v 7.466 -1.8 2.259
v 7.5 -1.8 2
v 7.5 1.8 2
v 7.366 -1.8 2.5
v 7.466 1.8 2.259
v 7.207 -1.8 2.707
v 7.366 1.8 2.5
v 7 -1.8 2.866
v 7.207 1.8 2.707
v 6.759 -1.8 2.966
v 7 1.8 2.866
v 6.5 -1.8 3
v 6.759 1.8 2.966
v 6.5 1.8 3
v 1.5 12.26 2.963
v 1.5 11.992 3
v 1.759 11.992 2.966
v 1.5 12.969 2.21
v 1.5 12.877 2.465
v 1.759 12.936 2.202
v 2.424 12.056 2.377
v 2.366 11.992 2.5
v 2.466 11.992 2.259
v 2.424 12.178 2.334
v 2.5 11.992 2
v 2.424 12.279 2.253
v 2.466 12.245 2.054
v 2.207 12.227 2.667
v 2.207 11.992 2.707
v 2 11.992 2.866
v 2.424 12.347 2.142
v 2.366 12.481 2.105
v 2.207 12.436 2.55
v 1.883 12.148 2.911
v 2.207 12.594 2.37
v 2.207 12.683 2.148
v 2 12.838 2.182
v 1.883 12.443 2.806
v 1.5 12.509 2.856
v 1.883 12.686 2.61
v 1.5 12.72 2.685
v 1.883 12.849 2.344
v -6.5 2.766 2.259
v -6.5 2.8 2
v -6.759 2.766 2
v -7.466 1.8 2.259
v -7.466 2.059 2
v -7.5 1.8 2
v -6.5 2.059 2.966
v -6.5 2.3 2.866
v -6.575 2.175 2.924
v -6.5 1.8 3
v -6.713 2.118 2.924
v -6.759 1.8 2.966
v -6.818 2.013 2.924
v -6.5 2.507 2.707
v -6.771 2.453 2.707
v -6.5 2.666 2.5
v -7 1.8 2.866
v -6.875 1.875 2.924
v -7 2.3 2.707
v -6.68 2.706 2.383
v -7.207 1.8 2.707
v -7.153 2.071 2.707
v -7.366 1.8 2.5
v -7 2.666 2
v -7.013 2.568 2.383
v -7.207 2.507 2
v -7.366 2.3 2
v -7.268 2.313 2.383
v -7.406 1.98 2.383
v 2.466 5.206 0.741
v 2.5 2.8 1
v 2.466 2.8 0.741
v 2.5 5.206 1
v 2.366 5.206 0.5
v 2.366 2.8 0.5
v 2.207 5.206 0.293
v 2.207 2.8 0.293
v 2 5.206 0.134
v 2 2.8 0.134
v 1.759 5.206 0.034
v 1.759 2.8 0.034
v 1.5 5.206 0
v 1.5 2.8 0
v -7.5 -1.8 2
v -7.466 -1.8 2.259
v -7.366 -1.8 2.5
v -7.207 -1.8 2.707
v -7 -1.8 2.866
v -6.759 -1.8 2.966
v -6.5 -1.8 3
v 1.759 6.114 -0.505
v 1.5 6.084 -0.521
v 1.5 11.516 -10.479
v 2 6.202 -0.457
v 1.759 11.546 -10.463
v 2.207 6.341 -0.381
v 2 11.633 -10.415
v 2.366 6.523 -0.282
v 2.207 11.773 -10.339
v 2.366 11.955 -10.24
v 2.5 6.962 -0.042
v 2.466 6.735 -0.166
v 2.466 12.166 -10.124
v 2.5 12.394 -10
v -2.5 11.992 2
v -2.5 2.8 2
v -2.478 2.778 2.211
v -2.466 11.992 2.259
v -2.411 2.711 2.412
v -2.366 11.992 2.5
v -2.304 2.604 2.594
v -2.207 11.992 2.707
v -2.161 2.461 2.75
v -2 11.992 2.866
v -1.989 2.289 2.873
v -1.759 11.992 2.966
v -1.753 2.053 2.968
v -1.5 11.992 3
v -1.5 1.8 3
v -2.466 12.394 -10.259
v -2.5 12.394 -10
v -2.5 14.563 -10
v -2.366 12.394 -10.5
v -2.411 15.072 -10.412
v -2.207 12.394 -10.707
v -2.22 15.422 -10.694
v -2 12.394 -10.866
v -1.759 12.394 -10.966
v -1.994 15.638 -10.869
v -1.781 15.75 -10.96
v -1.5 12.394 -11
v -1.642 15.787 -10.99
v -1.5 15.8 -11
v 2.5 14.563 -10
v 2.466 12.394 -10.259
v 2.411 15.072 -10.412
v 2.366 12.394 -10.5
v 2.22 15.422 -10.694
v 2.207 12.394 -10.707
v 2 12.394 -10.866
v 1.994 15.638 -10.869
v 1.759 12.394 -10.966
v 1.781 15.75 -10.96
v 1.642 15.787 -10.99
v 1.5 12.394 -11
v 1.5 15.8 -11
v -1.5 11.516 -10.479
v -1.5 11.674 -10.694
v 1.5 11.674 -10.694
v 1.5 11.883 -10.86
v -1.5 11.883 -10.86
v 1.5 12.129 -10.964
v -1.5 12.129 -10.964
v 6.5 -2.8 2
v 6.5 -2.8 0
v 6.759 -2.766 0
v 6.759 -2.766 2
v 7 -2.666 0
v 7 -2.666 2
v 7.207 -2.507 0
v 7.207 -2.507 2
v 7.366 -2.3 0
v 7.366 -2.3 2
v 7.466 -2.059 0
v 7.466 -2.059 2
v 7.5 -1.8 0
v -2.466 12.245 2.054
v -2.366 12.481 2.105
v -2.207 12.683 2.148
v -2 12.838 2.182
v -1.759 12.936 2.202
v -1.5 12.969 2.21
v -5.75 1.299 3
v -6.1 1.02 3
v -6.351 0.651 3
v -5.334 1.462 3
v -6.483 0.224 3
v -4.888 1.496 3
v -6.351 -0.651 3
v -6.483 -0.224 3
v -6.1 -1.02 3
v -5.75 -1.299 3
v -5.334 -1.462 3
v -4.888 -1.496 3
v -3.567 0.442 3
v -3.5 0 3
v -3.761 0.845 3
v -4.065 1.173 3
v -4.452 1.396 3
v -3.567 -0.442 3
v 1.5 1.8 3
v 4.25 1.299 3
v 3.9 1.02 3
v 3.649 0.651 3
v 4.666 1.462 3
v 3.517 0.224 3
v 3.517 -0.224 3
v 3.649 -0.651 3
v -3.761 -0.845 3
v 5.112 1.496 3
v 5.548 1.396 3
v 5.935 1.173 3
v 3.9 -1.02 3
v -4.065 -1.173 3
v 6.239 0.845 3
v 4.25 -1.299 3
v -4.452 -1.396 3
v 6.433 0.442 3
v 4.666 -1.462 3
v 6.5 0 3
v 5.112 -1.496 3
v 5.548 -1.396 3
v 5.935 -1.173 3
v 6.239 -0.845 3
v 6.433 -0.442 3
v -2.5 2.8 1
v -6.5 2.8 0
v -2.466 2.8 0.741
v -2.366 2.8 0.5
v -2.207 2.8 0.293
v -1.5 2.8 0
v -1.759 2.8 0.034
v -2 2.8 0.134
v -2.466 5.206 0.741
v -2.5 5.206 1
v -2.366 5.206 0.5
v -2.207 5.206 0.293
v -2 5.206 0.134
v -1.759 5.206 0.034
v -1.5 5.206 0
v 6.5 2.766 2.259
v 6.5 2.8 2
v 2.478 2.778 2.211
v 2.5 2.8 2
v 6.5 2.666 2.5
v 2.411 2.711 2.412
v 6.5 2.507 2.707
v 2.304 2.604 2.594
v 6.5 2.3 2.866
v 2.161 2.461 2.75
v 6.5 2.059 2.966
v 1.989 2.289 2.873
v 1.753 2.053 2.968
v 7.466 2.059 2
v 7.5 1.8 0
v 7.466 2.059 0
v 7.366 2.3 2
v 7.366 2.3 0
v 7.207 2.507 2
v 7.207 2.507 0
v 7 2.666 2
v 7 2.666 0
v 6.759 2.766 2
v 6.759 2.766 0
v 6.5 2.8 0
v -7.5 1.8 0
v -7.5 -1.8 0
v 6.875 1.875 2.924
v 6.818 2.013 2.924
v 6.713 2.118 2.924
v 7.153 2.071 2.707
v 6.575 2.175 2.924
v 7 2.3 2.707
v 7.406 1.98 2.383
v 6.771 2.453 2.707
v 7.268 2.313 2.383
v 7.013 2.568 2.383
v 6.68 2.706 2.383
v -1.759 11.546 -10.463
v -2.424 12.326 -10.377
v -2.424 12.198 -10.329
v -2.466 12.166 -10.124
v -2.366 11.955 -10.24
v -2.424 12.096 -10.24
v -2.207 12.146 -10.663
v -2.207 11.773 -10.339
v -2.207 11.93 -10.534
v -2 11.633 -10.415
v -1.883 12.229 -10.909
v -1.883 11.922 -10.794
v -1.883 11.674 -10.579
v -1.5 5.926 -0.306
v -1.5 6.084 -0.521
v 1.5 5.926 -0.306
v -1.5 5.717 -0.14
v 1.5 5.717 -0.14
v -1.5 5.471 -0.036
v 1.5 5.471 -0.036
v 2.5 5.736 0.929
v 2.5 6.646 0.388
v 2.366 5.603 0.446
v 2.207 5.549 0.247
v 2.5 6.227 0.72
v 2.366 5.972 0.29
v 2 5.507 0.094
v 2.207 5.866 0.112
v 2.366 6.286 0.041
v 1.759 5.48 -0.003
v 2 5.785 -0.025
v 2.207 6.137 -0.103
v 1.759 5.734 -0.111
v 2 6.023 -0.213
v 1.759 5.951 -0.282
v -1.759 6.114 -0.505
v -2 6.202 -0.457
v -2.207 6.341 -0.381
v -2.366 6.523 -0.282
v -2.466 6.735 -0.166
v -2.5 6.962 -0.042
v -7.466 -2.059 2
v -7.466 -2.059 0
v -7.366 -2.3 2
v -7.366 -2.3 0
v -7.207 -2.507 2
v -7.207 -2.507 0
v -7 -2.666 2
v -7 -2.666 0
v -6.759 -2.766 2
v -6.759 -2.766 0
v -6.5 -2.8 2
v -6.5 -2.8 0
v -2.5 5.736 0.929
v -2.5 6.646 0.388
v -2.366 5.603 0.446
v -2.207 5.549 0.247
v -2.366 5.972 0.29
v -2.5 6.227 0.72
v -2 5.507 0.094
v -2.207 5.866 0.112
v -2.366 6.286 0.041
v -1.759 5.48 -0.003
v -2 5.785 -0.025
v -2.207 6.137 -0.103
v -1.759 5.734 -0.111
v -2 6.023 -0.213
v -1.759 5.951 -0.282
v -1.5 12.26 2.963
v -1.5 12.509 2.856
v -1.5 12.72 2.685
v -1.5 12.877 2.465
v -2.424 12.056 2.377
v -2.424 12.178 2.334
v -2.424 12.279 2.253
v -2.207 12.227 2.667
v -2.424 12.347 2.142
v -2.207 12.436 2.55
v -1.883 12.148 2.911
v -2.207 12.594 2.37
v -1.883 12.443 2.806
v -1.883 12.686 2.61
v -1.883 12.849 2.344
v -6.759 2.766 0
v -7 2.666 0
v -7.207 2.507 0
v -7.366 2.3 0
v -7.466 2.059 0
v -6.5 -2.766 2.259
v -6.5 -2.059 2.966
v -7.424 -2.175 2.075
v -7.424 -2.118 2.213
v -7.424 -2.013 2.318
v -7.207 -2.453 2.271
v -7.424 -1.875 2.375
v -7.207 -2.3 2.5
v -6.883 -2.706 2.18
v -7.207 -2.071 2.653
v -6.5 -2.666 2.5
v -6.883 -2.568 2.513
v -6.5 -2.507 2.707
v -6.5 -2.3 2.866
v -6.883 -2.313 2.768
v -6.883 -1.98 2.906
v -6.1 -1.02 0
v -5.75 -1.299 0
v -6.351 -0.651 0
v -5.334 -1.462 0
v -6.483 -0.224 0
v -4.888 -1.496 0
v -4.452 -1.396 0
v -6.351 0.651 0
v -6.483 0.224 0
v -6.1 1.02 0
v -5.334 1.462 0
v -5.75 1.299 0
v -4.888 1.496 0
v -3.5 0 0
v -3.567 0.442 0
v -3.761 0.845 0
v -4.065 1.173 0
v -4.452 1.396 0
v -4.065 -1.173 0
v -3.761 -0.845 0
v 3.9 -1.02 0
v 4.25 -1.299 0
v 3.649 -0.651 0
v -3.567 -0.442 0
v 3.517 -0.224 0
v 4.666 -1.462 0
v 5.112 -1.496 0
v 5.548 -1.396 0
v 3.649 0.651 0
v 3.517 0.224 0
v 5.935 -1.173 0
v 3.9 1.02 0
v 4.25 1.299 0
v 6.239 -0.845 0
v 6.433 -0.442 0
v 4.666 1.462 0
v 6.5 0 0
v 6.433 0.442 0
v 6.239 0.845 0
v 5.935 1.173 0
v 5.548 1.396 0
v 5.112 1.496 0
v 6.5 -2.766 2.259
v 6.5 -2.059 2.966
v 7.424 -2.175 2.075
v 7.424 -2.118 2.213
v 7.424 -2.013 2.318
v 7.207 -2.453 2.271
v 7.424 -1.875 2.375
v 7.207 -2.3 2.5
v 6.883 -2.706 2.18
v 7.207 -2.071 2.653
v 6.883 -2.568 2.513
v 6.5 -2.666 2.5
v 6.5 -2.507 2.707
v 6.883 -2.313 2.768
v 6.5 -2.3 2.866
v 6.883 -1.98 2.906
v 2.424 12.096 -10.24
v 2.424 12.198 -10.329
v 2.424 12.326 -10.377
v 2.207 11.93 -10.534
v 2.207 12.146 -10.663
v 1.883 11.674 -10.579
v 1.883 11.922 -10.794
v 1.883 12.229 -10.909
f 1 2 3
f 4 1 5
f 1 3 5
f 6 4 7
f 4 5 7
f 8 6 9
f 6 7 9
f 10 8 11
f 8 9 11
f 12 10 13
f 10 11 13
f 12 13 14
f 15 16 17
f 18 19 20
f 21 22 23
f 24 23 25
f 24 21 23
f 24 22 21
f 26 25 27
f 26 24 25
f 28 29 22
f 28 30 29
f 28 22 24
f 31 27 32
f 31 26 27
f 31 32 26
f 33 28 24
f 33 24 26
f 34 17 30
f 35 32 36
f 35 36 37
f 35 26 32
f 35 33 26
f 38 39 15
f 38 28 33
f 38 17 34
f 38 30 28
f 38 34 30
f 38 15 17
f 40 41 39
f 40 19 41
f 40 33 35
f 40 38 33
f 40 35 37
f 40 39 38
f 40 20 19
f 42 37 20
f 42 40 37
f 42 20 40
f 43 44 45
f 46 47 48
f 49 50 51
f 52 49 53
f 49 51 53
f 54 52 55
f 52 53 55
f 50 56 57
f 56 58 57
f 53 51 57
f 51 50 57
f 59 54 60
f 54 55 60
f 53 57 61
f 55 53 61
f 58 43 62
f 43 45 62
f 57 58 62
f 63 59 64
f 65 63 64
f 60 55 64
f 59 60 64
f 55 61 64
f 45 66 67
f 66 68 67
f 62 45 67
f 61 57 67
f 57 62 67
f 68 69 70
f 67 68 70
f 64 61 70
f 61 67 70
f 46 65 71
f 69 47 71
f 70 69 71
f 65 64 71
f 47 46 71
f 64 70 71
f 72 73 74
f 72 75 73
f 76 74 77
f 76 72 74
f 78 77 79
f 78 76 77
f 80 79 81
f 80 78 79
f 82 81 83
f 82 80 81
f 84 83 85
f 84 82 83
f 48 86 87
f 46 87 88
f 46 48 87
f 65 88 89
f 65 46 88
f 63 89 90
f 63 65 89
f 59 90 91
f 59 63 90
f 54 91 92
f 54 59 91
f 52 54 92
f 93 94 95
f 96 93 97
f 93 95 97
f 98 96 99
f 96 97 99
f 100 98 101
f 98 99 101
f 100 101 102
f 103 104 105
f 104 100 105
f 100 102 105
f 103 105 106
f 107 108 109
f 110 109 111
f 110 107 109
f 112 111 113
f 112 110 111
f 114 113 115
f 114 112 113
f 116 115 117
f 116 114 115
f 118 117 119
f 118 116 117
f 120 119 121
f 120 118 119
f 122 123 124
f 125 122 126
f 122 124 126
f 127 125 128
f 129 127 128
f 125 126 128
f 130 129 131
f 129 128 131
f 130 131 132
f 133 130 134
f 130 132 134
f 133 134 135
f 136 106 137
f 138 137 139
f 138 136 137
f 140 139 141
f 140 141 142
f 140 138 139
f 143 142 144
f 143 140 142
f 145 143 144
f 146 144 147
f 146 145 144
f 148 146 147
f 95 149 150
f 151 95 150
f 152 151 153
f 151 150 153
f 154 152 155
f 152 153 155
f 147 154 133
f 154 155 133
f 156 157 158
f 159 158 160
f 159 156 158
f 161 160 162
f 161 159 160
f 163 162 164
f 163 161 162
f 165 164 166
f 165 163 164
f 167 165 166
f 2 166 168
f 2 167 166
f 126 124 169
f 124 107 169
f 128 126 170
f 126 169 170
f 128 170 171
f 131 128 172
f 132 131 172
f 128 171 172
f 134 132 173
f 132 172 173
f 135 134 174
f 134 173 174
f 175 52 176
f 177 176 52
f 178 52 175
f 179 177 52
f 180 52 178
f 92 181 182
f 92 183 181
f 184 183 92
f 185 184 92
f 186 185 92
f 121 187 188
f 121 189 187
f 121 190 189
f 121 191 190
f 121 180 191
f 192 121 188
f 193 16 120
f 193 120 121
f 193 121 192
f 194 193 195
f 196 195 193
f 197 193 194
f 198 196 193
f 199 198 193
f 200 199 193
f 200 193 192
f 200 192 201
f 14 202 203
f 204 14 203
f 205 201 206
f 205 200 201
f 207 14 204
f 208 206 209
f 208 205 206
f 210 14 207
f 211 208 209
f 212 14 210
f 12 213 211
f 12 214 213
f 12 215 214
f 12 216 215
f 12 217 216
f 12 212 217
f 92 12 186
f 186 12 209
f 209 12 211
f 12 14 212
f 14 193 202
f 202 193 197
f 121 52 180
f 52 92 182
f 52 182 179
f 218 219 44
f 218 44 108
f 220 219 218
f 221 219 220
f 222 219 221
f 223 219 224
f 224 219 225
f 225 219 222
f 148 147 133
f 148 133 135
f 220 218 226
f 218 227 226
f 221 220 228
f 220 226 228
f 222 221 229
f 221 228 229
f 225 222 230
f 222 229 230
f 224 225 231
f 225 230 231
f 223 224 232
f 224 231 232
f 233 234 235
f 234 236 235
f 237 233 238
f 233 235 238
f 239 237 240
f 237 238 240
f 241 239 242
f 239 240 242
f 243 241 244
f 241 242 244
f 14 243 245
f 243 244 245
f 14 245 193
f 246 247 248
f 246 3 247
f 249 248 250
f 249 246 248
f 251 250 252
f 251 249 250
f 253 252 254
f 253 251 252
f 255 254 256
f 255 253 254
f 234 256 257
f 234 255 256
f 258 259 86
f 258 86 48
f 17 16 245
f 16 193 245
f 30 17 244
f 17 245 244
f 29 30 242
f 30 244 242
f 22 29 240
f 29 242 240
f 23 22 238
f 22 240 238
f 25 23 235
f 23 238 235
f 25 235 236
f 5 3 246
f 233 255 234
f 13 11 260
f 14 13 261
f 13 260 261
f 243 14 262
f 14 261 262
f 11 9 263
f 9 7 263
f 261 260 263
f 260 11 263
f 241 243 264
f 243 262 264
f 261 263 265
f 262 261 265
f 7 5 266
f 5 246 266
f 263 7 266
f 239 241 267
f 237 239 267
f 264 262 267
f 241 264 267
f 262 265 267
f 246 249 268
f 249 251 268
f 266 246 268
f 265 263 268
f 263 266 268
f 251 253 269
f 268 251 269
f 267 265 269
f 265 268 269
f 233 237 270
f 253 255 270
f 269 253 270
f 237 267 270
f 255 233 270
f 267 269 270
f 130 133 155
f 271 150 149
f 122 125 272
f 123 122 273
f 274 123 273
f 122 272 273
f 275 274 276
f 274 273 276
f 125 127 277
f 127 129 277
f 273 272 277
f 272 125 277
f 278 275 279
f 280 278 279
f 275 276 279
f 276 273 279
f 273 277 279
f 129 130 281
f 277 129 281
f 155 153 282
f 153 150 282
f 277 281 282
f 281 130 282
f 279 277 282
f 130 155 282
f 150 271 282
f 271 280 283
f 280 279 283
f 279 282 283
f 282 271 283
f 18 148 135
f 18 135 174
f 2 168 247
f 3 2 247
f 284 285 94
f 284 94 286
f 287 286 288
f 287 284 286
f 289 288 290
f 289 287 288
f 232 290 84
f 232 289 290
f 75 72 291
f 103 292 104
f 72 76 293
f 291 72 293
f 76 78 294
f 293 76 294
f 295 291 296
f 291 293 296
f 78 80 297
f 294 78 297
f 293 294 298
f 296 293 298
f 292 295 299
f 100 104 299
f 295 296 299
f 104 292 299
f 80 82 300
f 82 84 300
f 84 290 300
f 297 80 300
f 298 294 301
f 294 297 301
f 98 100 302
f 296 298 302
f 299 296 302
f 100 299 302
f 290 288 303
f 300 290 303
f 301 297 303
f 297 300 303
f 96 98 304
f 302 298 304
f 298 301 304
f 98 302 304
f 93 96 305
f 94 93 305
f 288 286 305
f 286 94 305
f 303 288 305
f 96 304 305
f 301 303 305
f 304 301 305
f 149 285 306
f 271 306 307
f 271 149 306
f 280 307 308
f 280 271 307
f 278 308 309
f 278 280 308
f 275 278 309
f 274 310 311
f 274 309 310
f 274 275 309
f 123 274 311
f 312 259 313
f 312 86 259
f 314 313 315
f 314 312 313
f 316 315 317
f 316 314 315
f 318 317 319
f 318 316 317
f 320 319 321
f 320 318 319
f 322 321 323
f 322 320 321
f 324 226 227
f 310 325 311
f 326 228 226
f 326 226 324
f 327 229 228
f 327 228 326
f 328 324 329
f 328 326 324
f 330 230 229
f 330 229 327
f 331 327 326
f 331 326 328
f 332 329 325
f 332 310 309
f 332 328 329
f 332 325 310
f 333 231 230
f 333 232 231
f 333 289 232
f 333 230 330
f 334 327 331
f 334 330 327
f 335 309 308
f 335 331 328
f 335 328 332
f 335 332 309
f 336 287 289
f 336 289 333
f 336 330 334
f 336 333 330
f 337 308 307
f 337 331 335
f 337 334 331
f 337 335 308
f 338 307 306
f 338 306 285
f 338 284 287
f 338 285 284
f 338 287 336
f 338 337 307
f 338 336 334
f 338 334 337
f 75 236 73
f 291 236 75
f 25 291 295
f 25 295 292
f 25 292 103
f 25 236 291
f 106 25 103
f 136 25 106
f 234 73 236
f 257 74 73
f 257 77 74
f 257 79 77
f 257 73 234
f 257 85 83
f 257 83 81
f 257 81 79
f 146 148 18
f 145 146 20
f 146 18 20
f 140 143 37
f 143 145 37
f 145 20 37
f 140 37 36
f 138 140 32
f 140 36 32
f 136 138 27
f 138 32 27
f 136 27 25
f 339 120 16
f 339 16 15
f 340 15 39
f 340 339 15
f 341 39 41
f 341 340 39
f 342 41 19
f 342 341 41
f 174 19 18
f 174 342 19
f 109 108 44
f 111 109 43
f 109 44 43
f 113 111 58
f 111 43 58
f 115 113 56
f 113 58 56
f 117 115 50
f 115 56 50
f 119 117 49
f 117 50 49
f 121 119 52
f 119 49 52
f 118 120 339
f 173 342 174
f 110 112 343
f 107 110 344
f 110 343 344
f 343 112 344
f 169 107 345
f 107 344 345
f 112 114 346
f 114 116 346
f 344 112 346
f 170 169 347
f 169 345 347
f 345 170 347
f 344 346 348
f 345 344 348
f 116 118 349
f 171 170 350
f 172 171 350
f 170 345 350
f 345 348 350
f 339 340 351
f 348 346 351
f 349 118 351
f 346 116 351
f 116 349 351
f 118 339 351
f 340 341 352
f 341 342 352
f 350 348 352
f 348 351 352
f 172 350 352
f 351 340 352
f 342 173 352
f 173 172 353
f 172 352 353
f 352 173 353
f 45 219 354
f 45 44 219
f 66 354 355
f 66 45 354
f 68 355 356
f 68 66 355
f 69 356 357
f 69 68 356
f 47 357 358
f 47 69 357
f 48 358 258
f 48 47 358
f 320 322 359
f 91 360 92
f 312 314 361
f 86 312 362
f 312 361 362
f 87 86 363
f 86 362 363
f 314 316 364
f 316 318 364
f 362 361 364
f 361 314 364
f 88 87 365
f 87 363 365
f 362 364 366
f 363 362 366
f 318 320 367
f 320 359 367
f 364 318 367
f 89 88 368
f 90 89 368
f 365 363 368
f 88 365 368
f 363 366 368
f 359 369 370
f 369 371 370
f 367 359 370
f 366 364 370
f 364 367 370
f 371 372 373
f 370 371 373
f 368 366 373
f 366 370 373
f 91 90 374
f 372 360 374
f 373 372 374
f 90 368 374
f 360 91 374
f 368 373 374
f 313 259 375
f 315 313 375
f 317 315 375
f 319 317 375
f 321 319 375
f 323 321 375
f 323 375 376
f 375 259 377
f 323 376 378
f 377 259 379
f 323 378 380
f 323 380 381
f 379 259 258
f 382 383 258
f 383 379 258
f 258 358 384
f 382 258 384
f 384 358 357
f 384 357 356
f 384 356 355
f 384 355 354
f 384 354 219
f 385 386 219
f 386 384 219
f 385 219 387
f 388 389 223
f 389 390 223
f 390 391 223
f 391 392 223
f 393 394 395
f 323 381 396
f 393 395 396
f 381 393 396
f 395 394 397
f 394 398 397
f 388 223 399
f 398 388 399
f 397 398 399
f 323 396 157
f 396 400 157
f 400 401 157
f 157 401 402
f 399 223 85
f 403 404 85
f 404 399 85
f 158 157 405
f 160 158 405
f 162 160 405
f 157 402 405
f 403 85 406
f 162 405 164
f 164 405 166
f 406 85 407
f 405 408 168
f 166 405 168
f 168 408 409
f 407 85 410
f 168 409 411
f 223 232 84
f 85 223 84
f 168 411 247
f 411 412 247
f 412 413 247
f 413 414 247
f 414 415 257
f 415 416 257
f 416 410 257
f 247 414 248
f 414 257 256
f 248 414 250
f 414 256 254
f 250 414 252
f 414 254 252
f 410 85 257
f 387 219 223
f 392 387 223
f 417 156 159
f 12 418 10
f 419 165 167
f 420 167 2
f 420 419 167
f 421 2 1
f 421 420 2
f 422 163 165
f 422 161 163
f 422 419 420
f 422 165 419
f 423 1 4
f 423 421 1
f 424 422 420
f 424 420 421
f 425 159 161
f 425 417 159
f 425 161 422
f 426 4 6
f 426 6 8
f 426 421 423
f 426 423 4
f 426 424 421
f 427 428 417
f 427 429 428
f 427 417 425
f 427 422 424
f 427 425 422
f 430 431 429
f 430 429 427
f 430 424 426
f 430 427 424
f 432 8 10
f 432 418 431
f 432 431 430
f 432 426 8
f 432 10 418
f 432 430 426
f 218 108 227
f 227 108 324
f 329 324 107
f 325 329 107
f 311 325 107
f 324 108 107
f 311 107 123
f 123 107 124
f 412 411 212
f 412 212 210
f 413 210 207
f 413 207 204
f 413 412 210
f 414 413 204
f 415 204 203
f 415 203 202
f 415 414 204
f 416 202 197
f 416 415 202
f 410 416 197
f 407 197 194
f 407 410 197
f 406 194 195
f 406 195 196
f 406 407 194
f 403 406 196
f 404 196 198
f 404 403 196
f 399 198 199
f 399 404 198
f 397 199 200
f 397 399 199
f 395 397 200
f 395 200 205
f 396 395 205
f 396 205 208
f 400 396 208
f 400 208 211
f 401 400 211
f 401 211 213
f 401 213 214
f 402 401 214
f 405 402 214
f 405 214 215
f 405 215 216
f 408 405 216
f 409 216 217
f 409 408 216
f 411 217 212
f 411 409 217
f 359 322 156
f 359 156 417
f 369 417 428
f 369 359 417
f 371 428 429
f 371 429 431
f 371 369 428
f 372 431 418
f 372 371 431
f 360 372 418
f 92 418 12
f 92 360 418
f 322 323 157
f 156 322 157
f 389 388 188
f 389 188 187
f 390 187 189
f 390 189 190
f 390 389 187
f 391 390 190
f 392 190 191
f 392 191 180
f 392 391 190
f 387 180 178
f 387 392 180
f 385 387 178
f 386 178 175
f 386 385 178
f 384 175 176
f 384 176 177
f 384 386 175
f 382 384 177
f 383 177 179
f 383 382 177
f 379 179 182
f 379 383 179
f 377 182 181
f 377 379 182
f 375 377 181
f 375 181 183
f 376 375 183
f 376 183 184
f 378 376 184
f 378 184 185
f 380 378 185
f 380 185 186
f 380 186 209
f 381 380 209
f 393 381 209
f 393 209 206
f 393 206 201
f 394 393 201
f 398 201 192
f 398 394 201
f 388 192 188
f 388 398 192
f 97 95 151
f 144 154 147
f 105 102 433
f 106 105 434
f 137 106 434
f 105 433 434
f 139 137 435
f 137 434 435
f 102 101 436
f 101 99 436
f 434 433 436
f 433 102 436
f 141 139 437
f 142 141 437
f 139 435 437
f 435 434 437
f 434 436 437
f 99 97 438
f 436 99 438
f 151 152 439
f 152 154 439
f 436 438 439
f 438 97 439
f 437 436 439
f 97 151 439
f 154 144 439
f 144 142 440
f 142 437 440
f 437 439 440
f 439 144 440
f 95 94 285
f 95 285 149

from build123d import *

# Parameters (mm, degrees)
SKETCH2_W           = 5
SKETCH2_H           = 5.6
SKETCH2_R           = 1.5
BOSS_EXTRUDE1_DEPTH = 3
SKETCH5_W           = 5
SKETCH5_H           = 8
BOSS_EXTRUDE4_DEPTH = 3
BOSS_EXTRUDE5_DEPTH = 5
FILLET3_R           = 1


with BuildPart() as part:
    # Sketch2 → Boss-Extrude1 (new body)
    # profile 1 of 3: a face of its own
    with BuildSketch(Plane.XY):
        with Locations((-5, 0)):
            Rectangle(SKETCH2_W, SKETCH2_H)
        with Locations((-5, 0)):
            Circle(SKETCH2_R, mode=Mode.SUBTRACT)
    # profile 2 of 3: a face of its own
    with BuildSketch(Plane.XY):
        Rectangle(SKETCH2_W, SKETCH2_H)
    # profile 3 of 3: a face of its own
    with BuildSketch(Plane.XY):
        with Locations((5, 0)):
            Rectangle(SKETCH2_W, SKETCH2_H)
        with Locations((5, 0)):
            Circle(SKETCH2_R, mode=Mode.SUBTRACT)
    extrude(amount=BOSS_EXTRUDE1_DEPTH)

    # Sketch5 → Boss-Extrude4 (add)
    with BuildSketch(Plane.XY.offset(3)):
        with Locations((0, 6.8)):
            Rectangle(SKETCH5_W, SKETCH5_H)
    extrude(amount=-BOSS_EXTRUDE4_DEPTH)

    # Sketch6 → Boss-Extrude5 (add)
    with BuildSketch(Plane(origin=(2.5, 0, 0), x_dir=(0, 0, -1), z_dir=(1, 0, 0))):
        Polygon((0, 5.8), (11, 11.8), (11, 15.8), (-3, 12.8), (-3, 10.8), (0, 10.8), align=None)
    extrude(amount=-BOSS_EXTRUDE5_DEPTH)

    # Fillet3
    fillet3_edges = [part.edges().sort_by_distance(p)[0] for p in [
        (0, -2.8, 3),
        (-7.5, -2.8, 1.5),
        (-7.5, 2.8, 1.5),
        (7.5, 2.8, 1.5),
        (7.5, -2.8, 1.5),
        (7.5, 0, 3),
        (-5, 2.8, 3),
        (5, 2.8, 3),
        (-2.5, 7.8, 3),
        (2.5, 7.8, 3),
        (-2.5, 4.3, 0),
        (-7.5, 0, 3),
        (2.5, 4.3, 0),
        (2.5, 8.8, -5.5),
        (2.5, 13.8, -11),
        (2.5, 14.3, -4),
        (-2.5, 8.8, -5.5),
        (0, 11.8, -11),
        (-2.5, 13.8, -11),
        (-2.5, 14.3, -4),
        (0, 12.8, 3),
        (0, 5.8, 0),
    ]]
    fillet(fillet3_edges, radius=FILLET3_R - 0.0001)  # a hair under: the kernel refuses the full size


solid = part.part
